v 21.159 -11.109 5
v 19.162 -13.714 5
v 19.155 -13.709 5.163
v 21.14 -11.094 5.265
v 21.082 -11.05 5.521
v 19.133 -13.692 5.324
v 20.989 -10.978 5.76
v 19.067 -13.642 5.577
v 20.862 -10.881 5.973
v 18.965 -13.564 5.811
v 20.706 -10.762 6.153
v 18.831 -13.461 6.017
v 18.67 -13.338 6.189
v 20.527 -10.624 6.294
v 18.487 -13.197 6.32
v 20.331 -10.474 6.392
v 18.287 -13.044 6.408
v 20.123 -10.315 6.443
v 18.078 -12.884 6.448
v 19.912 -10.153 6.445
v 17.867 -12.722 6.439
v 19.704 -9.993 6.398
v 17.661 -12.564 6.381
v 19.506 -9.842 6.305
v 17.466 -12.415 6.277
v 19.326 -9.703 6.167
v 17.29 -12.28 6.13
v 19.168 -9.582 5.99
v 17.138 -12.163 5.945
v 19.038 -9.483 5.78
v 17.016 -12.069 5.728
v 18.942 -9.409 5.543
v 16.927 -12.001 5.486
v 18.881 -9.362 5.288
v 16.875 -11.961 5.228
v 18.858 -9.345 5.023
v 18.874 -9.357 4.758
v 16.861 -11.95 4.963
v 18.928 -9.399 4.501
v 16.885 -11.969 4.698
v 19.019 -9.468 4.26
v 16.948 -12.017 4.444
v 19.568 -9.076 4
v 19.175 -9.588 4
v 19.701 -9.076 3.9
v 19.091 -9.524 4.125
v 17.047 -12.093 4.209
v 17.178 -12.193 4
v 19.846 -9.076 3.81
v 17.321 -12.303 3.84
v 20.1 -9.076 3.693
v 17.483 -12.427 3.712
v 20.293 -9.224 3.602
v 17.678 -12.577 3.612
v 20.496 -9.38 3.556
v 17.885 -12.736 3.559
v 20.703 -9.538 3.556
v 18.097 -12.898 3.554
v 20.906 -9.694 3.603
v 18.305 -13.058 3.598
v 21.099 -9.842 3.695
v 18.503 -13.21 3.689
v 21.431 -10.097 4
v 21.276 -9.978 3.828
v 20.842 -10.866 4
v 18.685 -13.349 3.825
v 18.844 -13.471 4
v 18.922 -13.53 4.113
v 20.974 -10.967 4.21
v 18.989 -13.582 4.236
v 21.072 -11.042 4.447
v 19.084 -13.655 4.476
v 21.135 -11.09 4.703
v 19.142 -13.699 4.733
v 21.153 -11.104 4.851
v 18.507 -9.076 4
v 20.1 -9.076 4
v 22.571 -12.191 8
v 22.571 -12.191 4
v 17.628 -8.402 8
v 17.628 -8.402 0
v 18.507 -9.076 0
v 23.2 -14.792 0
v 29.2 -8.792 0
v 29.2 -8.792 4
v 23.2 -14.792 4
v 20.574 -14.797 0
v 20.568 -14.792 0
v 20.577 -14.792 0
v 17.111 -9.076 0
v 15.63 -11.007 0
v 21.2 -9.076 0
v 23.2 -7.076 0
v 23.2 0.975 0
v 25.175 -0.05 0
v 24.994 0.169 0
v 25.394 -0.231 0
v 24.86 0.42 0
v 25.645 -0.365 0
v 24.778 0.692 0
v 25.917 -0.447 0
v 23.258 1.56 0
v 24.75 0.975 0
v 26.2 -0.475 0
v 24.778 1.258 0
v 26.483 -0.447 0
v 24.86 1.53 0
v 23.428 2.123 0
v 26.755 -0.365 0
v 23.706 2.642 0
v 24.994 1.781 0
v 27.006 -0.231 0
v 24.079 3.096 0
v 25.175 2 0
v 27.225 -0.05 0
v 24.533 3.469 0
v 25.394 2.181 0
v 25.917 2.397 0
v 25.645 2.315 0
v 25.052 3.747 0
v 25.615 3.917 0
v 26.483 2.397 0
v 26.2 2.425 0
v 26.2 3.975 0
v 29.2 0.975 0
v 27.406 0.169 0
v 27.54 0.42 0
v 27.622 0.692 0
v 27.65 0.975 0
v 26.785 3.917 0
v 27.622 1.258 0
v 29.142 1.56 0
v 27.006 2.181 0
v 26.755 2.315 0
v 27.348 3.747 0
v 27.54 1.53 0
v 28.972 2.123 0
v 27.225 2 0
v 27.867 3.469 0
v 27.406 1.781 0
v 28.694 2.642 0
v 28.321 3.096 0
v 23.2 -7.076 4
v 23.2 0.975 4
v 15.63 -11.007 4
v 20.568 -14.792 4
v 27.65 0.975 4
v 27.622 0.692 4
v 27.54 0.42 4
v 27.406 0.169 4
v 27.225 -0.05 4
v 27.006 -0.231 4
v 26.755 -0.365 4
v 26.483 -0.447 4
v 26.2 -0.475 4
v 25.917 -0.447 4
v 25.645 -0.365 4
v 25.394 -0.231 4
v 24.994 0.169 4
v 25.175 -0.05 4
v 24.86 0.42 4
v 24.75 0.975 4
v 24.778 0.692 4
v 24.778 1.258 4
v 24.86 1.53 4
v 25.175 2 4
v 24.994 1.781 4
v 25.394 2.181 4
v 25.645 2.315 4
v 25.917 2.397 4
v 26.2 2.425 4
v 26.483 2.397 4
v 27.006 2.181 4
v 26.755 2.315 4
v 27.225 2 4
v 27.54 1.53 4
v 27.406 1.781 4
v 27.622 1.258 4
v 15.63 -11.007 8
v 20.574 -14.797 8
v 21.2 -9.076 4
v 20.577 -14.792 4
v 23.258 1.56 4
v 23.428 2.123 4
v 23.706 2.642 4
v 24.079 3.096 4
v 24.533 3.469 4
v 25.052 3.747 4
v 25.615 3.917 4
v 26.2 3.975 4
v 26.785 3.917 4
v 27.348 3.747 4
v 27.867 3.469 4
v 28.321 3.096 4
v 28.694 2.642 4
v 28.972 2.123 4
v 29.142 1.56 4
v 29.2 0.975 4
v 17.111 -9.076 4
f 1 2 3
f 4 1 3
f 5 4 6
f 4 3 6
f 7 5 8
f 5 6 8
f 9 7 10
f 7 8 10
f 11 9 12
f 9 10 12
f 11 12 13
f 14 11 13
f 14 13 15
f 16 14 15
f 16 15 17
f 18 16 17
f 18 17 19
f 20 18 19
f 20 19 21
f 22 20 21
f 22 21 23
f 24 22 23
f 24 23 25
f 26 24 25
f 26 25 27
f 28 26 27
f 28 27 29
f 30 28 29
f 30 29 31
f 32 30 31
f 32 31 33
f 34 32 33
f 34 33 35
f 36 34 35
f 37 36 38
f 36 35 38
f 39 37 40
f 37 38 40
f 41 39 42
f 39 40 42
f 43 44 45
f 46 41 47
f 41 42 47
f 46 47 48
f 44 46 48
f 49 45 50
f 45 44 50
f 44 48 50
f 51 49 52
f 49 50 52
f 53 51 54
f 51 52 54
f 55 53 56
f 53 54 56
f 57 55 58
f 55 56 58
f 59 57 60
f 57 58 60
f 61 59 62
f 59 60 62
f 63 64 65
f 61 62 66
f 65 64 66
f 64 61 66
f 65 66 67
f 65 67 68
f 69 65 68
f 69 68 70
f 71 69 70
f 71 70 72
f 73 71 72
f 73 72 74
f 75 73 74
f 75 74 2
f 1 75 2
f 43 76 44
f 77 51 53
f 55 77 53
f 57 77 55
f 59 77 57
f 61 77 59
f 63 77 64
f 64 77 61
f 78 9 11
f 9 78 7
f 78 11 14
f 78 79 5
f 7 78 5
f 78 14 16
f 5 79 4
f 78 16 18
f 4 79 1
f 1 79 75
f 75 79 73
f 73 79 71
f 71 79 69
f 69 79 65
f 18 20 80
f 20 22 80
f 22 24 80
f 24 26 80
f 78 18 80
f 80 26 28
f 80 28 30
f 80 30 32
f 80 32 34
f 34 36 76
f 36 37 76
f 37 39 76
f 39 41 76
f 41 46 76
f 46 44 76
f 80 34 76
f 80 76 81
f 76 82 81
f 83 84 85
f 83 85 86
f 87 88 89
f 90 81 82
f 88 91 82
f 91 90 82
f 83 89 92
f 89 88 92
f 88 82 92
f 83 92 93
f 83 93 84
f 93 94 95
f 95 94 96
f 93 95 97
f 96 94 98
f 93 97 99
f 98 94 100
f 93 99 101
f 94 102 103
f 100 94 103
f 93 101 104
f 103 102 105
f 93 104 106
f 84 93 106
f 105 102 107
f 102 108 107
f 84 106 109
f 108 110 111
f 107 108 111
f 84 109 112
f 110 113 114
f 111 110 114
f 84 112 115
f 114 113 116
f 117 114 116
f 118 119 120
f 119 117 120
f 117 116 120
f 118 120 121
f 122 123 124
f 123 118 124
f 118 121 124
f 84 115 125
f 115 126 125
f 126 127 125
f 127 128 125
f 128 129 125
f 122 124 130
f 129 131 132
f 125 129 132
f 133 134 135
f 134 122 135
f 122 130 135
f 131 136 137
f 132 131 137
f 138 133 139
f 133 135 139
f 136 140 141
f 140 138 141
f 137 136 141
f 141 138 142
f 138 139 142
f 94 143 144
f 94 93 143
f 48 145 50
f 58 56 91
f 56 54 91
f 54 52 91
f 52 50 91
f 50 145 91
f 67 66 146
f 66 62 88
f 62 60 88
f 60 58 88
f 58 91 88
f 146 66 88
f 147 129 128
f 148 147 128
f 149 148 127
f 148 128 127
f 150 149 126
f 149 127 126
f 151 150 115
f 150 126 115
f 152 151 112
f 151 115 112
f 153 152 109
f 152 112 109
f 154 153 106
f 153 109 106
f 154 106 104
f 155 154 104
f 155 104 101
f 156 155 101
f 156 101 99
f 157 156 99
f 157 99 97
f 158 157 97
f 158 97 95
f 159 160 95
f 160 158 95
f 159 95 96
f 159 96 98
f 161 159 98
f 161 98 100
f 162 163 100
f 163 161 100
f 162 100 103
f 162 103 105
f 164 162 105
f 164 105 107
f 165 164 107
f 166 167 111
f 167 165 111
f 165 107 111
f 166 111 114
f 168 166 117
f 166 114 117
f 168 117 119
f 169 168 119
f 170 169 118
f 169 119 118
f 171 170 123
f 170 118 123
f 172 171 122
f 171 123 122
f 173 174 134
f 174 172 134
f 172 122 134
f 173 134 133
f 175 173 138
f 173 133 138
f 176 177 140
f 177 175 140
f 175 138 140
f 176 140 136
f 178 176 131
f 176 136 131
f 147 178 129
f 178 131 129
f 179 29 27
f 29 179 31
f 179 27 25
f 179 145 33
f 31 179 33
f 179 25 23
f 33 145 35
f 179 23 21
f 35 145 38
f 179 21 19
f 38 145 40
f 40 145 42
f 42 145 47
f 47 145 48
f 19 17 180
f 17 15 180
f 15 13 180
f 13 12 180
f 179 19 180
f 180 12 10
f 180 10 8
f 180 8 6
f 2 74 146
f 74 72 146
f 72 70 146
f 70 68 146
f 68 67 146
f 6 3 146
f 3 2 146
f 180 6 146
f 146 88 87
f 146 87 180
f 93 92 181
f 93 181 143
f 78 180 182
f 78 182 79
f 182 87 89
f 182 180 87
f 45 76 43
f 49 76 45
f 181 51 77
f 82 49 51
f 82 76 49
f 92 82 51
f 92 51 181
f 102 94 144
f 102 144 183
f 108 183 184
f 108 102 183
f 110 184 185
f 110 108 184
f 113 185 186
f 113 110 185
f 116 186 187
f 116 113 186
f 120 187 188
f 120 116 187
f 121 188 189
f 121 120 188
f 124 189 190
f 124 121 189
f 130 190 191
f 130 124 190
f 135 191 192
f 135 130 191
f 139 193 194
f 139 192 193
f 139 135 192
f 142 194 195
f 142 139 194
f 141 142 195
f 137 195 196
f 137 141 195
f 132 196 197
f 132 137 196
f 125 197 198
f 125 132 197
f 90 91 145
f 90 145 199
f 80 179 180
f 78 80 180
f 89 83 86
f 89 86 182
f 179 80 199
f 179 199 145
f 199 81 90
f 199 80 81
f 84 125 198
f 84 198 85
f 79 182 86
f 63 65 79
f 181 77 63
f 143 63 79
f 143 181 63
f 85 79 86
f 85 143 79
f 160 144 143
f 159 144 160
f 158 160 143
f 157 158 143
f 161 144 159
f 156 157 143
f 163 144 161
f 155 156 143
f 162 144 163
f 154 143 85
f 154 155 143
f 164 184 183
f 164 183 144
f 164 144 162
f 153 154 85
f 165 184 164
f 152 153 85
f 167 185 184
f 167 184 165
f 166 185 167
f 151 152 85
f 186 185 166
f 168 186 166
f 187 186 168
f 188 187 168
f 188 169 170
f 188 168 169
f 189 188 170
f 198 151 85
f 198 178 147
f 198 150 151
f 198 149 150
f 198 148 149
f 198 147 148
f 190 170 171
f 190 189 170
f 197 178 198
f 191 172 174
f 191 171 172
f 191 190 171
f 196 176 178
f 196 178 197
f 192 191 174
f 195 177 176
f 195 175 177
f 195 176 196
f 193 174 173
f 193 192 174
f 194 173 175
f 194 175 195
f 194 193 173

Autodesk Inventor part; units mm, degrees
ref_plane "YZ Plane" through (0, 0, 0) normal (1, 0, 0) x (0, 1, 0)
ref_plane "XZ Plane" through (0, 0, 0) normal (0, 1, 0) x (-1, 0, 0)
ref_plane "XY Plane" through (0, 0, 0) normal (0, 0, 1) x (1, 0, 0)
sketch "Szkic1" plane through (0, 0, 0) normal (0, 0, 1) x (1, 0, 0)
  circle A0 centre (26.2, 0.975) radius 1.45 projected
  circle A1 centre (26.2, 0.975) radius 3
  line L0 (29.2, 0.975) -> (29.2, -8.7925)
  line L1 (23.2, -14.7925) -> (20.5681, -14.7925)
  line L2 (17.1107, -9.0757) -> (21.2, -9.0757)
  line L3 (23.2, -7.0757) -> (23.2, 0.975)
  line L4 (18.2447, -12.1144) -> (21.525, -14.6291)
  line L5 (16.8275, -11.925) -> (-16.8275, 13.875) construction
  line L6 (20.0699, -9.7335) -> (23.3502, -12.2482)
  line L7 (18.2447, -12.1144) -> (20.0699, -9.7335)
  line L8 (21.525, -14.6291) -> (23.3502, -12.2482)
  line L9 (29.2, -8.7925) -> (23.2, -14.7925)
  line L10 (15.6301, -11.0071) -> (17.1107, -9.0757)
  line L11 (21.2, -9.0757) -> (23.2, -7.0757)
  line L12 (15.6301, -11.0071) -> (20.5681, -14.7925)
  point P0 (0, 0)
  point P1 (29.2, -14.7925)
  point P2 (18.5681, -14.7925)
  point P3 (15.1107, -9.0757)
  point P4 (23.2, -9.0757)
  point P5 (18.9313, -9.4578)
  point P6 (19.7101, -9.4578)
  dimension "d0" = 3
  dimension "d5" = 6
  dimension "d6" = 6
  dimension "d7" = 2
  dimension "d9" = 2
  dimension "d10" = 2
  dimension "d11" = 2
  dimension "d12" = 2
  dimension "d13" = 6
extrude "Wyciągnięcie proste1" add sketch "Szkic1" along normal blind 4 contours A1 | L0 L9 L1 L12 L10 L2 L11 L3 A1 | L7 L6 L8 L4
sketch "Szkic4" plane through (0, 0, 4) normal (0, 0, 1) x (1, 0, 0)
  line L0 (22.5711, -12.1912) -> (17.6276, -8.4015)
  line L1 (16.8275, -11.925) -> (-16.8275, 13.875) construction
  line L2 (17.6276, -8.4015) -> (15.6301, -11.0071)
  line L3 (15.6301, -11.0071) -> (20.5737, -14.7968)
  line L4 (20.5737, -14.7968) -> (22.5711, -12.1912)
  line L5 (15.6301, -11.0071) -> (20.5681, -14.7925) projected
  line L6 (17.1107, -9.0757) -> (15.6301, -11.0071) projected
  point P0 (0, 0)
extrude "Wyciągnięcie proste2" add sketch "Szkic4" along normal blind 4 and the other way blind 4
sketch "Szkic5" plane through (20.5737, -14.7968, 0) normal (-0.6084, -0.7936, 0) x (0.7936, -0.6084, 0)
  circle A0 centre (-3.229, 5) radius 1.45
  line L0 (-6.229, 0) -> (-6.229, 8) projected
  line L1 (-6.229, 8) -> (0, 8) projected
  point P0 (-25.3303, 0)
  dimension "d16" = 3
  dimension "d17" = 3
  dimension "d18" = 2.9
extrude "Wyciągnięcie proste3" cut sketch "Szkic5" against normal blind 4.25
equation "\"d6\" = d5"
equation "\"d9\" = d7"
equation "\"d10\" = d9"
equation "\"d11\" = d7"
equation "\"d12\" = d11"
properties part number "mirror_arm"
